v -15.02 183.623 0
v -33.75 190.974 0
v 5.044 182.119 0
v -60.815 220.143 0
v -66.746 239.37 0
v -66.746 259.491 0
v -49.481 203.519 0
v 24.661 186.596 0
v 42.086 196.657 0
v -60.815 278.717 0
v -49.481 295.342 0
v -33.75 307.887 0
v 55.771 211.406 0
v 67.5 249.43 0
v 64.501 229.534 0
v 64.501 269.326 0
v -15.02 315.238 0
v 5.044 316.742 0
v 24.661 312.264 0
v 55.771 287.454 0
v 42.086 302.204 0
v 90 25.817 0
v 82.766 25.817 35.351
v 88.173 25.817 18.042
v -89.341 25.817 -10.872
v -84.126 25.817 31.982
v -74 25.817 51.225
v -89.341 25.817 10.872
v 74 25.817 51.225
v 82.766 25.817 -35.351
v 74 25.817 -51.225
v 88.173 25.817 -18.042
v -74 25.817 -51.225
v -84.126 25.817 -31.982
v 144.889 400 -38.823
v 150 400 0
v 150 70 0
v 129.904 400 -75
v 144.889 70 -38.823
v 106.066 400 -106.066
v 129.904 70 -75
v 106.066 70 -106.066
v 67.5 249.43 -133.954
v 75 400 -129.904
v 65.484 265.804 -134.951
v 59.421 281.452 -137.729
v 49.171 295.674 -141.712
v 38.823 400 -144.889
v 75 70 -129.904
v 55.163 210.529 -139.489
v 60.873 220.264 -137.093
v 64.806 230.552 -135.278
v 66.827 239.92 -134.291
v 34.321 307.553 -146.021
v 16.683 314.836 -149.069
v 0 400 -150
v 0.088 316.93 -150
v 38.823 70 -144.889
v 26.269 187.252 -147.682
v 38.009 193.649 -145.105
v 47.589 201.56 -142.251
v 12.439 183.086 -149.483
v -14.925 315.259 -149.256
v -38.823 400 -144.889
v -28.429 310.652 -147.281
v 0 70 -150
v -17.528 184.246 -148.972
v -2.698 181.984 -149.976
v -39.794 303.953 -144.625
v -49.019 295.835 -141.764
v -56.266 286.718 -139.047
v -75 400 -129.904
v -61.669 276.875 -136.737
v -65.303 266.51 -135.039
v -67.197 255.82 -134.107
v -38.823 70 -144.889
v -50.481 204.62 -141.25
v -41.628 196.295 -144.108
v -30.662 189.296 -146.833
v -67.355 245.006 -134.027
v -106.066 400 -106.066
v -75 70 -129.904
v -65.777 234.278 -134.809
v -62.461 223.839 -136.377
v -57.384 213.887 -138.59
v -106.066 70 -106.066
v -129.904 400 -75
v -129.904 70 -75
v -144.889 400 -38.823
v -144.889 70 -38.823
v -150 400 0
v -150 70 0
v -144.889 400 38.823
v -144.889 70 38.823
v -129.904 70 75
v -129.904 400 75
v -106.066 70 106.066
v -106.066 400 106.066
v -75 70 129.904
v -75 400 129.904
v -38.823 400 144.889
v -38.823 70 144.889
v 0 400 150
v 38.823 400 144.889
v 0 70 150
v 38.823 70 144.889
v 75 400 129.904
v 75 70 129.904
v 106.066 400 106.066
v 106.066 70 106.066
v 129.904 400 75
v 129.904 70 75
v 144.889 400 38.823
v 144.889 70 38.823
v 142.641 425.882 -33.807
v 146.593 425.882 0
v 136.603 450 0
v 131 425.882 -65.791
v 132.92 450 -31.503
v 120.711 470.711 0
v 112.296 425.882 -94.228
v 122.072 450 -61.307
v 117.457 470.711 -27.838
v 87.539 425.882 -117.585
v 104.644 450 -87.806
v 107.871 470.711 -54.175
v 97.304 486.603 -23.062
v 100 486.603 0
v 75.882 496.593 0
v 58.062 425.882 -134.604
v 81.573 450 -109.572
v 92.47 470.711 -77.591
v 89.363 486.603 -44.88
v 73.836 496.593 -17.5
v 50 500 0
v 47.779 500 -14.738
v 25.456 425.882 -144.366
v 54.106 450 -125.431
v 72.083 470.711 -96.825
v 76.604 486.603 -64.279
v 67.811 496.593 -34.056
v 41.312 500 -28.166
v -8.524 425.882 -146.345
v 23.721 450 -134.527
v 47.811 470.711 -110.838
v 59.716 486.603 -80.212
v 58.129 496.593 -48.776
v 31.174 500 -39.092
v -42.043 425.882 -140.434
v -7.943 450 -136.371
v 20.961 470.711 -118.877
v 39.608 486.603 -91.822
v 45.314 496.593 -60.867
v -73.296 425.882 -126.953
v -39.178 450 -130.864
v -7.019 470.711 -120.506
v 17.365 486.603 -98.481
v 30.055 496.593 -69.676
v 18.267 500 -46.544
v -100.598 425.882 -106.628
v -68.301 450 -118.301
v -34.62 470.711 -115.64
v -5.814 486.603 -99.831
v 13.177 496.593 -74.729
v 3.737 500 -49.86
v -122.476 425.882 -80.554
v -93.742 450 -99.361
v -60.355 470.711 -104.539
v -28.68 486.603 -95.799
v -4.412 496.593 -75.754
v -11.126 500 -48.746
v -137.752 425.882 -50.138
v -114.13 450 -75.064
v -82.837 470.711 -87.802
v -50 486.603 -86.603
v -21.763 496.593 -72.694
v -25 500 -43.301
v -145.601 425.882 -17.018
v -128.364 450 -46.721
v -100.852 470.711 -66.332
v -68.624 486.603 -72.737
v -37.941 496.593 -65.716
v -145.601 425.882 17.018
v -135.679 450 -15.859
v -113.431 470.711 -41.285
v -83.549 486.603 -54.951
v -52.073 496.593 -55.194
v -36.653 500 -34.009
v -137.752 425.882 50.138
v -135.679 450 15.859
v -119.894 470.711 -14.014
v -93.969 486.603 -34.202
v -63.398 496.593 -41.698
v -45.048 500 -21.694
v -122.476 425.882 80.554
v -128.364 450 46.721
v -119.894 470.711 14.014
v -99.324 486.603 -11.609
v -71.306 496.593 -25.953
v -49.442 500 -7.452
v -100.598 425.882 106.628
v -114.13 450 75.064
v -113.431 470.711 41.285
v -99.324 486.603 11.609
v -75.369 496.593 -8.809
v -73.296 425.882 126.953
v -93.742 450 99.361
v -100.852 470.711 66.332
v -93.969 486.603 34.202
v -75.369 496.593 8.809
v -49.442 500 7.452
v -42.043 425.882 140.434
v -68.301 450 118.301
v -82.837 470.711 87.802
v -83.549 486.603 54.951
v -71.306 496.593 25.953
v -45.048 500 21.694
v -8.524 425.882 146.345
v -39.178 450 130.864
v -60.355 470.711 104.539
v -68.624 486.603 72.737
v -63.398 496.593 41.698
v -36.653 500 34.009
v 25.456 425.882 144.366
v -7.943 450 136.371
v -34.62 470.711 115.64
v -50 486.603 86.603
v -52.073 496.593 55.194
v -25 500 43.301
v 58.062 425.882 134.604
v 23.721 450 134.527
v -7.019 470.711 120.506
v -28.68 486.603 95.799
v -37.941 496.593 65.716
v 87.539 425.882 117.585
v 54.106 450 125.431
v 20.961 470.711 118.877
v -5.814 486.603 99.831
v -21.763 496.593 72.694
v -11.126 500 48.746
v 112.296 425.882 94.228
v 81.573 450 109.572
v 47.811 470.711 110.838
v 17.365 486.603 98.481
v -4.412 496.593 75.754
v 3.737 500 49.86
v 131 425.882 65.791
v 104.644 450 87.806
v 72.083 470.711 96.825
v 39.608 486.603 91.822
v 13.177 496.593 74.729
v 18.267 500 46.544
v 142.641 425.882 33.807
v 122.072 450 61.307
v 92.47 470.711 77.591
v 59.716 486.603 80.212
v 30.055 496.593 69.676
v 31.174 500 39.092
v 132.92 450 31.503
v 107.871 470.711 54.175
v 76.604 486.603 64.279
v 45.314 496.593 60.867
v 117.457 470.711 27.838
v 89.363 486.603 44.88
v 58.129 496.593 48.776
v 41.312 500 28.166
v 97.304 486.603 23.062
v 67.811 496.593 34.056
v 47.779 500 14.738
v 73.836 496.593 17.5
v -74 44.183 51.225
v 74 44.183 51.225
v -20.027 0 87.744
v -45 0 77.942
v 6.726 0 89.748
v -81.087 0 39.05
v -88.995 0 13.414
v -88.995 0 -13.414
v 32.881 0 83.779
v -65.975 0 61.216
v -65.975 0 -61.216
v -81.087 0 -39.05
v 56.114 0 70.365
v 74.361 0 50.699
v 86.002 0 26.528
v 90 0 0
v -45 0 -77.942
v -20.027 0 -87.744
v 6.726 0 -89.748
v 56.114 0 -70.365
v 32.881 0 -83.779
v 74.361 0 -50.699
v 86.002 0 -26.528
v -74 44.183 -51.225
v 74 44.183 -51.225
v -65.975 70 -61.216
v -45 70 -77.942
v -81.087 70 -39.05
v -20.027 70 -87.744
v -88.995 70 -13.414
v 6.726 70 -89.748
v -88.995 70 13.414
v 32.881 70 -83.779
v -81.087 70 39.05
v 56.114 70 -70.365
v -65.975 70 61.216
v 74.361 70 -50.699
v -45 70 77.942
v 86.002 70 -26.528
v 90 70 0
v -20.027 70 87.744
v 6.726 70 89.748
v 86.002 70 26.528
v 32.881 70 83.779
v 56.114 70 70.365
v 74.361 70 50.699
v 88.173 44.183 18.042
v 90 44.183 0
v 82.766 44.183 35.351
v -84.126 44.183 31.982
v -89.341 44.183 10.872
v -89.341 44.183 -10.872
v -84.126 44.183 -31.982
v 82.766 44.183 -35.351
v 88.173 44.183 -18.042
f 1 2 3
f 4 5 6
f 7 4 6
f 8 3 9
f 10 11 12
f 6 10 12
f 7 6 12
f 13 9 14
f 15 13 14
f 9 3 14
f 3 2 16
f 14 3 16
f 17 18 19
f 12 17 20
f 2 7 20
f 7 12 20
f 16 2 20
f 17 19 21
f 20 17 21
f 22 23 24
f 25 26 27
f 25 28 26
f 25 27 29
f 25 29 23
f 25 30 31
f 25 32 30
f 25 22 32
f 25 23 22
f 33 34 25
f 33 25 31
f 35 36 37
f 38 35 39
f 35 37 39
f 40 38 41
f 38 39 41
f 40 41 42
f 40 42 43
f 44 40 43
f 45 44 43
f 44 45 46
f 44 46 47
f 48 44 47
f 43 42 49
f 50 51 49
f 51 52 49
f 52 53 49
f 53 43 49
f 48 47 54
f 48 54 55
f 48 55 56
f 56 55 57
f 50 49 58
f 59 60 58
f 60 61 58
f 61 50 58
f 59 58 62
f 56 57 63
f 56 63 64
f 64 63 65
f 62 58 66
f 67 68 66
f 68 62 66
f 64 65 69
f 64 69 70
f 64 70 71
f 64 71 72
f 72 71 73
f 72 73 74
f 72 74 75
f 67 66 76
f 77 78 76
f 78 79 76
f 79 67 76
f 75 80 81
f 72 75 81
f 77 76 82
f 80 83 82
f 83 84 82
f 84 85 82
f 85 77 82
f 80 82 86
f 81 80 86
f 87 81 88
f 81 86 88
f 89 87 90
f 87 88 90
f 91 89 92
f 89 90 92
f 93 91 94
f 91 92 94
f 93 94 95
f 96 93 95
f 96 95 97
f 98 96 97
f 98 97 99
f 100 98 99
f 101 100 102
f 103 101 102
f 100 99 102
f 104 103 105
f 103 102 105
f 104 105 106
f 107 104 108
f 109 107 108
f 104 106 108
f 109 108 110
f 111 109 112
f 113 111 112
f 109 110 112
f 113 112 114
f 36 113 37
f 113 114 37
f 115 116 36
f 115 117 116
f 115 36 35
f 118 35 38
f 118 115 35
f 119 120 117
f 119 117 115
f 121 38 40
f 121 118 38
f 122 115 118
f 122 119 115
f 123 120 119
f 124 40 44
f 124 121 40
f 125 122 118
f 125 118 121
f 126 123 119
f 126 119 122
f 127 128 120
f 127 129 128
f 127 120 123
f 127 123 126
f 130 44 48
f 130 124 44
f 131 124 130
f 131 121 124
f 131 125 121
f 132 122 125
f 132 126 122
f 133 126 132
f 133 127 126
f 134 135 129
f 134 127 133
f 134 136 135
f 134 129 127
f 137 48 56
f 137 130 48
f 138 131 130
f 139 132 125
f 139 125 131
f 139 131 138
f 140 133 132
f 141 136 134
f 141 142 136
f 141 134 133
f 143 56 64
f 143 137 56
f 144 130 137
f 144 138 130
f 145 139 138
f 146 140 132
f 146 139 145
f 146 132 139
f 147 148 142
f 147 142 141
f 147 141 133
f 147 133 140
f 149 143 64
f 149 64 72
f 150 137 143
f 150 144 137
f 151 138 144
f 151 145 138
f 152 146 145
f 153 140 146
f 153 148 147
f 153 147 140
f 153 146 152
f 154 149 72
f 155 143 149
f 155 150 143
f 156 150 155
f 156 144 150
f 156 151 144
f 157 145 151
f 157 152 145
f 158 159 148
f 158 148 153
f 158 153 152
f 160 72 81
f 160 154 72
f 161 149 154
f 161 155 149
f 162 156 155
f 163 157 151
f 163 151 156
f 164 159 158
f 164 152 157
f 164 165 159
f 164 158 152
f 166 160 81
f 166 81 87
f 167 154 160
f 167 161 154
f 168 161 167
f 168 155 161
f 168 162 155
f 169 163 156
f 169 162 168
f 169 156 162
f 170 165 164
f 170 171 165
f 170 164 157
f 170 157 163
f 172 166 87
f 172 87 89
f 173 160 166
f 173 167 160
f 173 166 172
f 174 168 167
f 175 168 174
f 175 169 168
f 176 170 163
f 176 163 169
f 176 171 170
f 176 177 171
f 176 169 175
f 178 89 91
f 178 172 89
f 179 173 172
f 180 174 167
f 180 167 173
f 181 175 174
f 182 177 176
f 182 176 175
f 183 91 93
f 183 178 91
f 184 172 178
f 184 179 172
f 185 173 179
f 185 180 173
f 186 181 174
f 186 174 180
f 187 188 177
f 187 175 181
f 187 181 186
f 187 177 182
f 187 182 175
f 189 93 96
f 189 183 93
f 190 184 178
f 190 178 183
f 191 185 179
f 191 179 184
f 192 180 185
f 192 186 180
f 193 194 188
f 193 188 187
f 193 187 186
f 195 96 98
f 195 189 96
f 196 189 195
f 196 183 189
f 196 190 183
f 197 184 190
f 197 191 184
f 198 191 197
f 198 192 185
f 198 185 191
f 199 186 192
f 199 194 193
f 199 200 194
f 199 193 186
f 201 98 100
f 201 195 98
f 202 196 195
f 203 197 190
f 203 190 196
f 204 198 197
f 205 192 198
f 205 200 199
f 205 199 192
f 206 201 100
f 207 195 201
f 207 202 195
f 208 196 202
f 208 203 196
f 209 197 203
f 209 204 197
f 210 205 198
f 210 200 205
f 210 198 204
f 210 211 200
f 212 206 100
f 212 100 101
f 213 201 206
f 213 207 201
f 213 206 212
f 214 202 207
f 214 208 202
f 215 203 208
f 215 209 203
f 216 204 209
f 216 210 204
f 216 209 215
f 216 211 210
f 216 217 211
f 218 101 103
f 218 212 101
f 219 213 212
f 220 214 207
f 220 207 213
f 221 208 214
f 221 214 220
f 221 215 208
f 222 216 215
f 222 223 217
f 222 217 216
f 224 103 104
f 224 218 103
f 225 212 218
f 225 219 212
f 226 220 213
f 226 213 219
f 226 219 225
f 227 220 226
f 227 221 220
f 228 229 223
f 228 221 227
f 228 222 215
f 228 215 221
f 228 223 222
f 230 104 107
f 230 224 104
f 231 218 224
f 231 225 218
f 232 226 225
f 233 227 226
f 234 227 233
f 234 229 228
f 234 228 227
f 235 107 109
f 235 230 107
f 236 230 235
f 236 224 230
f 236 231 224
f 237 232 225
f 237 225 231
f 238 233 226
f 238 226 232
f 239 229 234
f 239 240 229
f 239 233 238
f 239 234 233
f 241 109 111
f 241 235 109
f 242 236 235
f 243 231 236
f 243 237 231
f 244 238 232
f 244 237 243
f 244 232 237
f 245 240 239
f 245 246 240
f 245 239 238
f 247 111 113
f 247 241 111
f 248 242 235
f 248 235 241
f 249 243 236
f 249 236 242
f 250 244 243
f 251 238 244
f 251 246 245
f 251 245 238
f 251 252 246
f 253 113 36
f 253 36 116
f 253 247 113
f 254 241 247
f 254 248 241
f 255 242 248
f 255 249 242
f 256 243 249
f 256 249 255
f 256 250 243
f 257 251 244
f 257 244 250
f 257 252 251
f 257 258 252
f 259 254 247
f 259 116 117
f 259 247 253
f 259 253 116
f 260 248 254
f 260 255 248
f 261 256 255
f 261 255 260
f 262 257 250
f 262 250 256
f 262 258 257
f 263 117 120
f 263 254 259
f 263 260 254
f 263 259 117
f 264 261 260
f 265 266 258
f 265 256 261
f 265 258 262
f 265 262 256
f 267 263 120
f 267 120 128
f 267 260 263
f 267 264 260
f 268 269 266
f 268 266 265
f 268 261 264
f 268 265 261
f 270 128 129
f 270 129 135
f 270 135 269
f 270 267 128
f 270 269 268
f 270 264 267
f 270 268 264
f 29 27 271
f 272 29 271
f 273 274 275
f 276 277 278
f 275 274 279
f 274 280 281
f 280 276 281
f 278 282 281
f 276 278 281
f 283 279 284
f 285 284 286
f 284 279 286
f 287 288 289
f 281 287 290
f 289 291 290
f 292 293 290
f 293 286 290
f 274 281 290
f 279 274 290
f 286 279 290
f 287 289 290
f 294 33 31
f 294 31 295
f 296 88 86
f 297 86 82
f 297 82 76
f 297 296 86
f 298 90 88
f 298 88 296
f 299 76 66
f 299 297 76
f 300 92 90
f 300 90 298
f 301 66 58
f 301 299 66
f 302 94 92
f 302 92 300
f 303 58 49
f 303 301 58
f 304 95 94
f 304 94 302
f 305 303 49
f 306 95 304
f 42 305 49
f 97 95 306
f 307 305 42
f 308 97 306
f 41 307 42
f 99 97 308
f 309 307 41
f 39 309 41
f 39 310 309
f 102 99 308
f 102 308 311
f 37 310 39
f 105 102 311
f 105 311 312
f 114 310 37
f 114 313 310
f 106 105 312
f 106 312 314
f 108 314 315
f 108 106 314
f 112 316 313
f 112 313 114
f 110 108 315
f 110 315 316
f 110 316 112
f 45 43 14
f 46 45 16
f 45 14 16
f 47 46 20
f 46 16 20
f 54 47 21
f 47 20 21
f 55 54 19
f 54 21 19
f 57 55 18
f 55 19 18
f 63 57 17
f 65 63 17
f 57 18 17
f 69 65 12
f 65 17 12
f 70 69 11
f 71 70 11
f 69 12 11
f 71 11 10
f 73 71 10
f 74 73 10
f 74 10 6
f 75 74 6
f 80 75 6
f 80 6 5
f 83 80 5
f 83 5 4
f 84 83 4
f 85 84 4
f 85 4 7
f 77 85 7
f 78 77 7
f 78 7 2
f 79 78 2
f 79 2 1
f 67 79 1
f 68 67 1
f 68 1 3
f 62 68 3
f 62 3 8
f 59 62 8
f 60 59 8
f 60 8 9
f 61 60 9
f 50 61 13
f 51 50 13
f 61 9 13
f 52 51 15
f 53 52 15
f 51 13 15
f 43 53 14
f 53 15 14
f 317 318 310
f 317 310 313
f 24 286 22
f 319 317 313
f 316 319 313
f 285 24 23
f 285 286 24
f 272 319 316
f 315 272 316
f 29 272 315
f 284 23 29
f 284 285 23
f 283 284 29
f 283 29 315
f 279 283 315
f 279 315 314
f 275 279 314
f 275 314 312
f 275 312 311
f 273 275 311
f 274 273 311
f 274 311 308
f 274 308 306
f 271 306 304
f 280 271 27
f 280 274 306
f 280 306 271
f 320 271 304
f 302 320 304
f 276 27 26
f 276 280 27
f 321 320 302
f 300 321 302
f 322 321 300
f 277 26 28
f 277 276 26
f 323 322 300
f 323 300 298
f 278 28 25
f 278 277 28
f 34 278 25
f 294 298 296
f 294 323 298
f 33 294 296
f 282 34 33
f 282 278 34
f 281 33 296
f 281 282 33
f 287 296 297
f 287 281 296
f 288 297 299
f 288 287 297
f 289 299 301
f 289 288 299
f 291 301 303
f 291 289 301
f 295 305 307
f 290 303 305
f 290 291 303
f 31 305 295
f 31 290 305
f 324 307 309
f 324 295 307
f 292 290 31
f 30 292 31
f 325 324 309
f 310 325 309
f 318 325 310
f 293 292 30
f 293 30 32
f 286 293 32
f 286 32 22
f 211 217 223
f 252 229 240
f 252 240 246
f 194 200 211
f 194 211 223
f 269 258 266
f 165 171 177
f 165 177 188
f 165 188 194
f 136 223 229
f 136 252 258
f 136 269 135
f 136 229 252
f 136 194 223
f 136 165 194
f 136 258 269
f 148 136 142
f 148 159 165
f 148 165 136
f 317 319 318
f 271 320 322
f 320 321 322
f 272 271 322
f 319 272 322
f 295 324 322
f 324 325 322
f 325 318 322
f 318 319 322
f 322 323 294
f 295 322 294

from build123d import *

# Parameters (mm, degrees)
SKETCH1_R               = 150
BOSS_EXTRUDE1_DEPTH     = 500
SKETCH2_R               = 150
SKETCH2_R_2             = 90
CUT_EXTRUDE1_DEPTH      = 70
SKETCH3_W               = 102.450978838
SKETCH3_H               = 18.366336908
CUT_EXTRUDE2_DEPTH      = 151
CUT_EXTRUDE2_DEPTH_BACK = 151
FILLET1_R               = 100
SKETCH4_R               = 67.5
CUT_EXTRUDE3_DEPTH      = 151


with BuildPart() as part:
    # Sketch1 → Boss-Extrude1 (new body)
    with BuildSketch(Plane(origin=(0, 0, 0), x_dir=(1, 0, 0), z_dir=(0, 1, 0))):
        Circle(SKETCH1_R)
    extrude(amount=BOSS_EXTRUDE1_DEPTH)

    # Sketch2 → Cut-Extrude1 (cut)
    with BuildSketch(Plane.XZ):
        Circle(SKETCH2_R)
        Circle(SKETCH2_R_2, mode=Mode.SUBTRACT)
    extrude(amount=-CUT_EXTRUDE1_DEPTH, mode=Mode.SUBTRACT)

    # Sketch3 → Cut-Extrude2 (cut, two sides)
    with BuildSketch(Plane(origin=(0, 0, 0), x_dir=(0, 0, -1), z_dir=(1, 0, 0))) as cut_extrude2_sk:
        with Locations((0, 35)):
            Rectangle(SKETCH3_W, SKETCH3_H)
    extrude(amount=CUT_EXTRUDE2_DEPTH, mode=Mode.SUBTRACT)
    extrude(cut_extrude2_sk.sketch, amount=-CUT_EXTRUDE2_DEPTH_BACK, mode=Mode.SUBTRACT)

    # Fillet1
    fillet1_edges = [part.edges().sort_by_distance(p)[0] for p in [
        (-150, 500, 0),
    ]]
    fillet(fillet1_edges, radius=FILLET1_R)

    # Sketch4 → Cut-Extrude3 (cut, through all)
    with BuildSketch(Plane.XY):
        with Locations((0, 249.430268714)):
            Circle(SKETCH4_R)
    extrude(amount=-CUT_EXTRUDE3_DEPTH, mode=Mode.SUBTRACT)


solid = part.part
